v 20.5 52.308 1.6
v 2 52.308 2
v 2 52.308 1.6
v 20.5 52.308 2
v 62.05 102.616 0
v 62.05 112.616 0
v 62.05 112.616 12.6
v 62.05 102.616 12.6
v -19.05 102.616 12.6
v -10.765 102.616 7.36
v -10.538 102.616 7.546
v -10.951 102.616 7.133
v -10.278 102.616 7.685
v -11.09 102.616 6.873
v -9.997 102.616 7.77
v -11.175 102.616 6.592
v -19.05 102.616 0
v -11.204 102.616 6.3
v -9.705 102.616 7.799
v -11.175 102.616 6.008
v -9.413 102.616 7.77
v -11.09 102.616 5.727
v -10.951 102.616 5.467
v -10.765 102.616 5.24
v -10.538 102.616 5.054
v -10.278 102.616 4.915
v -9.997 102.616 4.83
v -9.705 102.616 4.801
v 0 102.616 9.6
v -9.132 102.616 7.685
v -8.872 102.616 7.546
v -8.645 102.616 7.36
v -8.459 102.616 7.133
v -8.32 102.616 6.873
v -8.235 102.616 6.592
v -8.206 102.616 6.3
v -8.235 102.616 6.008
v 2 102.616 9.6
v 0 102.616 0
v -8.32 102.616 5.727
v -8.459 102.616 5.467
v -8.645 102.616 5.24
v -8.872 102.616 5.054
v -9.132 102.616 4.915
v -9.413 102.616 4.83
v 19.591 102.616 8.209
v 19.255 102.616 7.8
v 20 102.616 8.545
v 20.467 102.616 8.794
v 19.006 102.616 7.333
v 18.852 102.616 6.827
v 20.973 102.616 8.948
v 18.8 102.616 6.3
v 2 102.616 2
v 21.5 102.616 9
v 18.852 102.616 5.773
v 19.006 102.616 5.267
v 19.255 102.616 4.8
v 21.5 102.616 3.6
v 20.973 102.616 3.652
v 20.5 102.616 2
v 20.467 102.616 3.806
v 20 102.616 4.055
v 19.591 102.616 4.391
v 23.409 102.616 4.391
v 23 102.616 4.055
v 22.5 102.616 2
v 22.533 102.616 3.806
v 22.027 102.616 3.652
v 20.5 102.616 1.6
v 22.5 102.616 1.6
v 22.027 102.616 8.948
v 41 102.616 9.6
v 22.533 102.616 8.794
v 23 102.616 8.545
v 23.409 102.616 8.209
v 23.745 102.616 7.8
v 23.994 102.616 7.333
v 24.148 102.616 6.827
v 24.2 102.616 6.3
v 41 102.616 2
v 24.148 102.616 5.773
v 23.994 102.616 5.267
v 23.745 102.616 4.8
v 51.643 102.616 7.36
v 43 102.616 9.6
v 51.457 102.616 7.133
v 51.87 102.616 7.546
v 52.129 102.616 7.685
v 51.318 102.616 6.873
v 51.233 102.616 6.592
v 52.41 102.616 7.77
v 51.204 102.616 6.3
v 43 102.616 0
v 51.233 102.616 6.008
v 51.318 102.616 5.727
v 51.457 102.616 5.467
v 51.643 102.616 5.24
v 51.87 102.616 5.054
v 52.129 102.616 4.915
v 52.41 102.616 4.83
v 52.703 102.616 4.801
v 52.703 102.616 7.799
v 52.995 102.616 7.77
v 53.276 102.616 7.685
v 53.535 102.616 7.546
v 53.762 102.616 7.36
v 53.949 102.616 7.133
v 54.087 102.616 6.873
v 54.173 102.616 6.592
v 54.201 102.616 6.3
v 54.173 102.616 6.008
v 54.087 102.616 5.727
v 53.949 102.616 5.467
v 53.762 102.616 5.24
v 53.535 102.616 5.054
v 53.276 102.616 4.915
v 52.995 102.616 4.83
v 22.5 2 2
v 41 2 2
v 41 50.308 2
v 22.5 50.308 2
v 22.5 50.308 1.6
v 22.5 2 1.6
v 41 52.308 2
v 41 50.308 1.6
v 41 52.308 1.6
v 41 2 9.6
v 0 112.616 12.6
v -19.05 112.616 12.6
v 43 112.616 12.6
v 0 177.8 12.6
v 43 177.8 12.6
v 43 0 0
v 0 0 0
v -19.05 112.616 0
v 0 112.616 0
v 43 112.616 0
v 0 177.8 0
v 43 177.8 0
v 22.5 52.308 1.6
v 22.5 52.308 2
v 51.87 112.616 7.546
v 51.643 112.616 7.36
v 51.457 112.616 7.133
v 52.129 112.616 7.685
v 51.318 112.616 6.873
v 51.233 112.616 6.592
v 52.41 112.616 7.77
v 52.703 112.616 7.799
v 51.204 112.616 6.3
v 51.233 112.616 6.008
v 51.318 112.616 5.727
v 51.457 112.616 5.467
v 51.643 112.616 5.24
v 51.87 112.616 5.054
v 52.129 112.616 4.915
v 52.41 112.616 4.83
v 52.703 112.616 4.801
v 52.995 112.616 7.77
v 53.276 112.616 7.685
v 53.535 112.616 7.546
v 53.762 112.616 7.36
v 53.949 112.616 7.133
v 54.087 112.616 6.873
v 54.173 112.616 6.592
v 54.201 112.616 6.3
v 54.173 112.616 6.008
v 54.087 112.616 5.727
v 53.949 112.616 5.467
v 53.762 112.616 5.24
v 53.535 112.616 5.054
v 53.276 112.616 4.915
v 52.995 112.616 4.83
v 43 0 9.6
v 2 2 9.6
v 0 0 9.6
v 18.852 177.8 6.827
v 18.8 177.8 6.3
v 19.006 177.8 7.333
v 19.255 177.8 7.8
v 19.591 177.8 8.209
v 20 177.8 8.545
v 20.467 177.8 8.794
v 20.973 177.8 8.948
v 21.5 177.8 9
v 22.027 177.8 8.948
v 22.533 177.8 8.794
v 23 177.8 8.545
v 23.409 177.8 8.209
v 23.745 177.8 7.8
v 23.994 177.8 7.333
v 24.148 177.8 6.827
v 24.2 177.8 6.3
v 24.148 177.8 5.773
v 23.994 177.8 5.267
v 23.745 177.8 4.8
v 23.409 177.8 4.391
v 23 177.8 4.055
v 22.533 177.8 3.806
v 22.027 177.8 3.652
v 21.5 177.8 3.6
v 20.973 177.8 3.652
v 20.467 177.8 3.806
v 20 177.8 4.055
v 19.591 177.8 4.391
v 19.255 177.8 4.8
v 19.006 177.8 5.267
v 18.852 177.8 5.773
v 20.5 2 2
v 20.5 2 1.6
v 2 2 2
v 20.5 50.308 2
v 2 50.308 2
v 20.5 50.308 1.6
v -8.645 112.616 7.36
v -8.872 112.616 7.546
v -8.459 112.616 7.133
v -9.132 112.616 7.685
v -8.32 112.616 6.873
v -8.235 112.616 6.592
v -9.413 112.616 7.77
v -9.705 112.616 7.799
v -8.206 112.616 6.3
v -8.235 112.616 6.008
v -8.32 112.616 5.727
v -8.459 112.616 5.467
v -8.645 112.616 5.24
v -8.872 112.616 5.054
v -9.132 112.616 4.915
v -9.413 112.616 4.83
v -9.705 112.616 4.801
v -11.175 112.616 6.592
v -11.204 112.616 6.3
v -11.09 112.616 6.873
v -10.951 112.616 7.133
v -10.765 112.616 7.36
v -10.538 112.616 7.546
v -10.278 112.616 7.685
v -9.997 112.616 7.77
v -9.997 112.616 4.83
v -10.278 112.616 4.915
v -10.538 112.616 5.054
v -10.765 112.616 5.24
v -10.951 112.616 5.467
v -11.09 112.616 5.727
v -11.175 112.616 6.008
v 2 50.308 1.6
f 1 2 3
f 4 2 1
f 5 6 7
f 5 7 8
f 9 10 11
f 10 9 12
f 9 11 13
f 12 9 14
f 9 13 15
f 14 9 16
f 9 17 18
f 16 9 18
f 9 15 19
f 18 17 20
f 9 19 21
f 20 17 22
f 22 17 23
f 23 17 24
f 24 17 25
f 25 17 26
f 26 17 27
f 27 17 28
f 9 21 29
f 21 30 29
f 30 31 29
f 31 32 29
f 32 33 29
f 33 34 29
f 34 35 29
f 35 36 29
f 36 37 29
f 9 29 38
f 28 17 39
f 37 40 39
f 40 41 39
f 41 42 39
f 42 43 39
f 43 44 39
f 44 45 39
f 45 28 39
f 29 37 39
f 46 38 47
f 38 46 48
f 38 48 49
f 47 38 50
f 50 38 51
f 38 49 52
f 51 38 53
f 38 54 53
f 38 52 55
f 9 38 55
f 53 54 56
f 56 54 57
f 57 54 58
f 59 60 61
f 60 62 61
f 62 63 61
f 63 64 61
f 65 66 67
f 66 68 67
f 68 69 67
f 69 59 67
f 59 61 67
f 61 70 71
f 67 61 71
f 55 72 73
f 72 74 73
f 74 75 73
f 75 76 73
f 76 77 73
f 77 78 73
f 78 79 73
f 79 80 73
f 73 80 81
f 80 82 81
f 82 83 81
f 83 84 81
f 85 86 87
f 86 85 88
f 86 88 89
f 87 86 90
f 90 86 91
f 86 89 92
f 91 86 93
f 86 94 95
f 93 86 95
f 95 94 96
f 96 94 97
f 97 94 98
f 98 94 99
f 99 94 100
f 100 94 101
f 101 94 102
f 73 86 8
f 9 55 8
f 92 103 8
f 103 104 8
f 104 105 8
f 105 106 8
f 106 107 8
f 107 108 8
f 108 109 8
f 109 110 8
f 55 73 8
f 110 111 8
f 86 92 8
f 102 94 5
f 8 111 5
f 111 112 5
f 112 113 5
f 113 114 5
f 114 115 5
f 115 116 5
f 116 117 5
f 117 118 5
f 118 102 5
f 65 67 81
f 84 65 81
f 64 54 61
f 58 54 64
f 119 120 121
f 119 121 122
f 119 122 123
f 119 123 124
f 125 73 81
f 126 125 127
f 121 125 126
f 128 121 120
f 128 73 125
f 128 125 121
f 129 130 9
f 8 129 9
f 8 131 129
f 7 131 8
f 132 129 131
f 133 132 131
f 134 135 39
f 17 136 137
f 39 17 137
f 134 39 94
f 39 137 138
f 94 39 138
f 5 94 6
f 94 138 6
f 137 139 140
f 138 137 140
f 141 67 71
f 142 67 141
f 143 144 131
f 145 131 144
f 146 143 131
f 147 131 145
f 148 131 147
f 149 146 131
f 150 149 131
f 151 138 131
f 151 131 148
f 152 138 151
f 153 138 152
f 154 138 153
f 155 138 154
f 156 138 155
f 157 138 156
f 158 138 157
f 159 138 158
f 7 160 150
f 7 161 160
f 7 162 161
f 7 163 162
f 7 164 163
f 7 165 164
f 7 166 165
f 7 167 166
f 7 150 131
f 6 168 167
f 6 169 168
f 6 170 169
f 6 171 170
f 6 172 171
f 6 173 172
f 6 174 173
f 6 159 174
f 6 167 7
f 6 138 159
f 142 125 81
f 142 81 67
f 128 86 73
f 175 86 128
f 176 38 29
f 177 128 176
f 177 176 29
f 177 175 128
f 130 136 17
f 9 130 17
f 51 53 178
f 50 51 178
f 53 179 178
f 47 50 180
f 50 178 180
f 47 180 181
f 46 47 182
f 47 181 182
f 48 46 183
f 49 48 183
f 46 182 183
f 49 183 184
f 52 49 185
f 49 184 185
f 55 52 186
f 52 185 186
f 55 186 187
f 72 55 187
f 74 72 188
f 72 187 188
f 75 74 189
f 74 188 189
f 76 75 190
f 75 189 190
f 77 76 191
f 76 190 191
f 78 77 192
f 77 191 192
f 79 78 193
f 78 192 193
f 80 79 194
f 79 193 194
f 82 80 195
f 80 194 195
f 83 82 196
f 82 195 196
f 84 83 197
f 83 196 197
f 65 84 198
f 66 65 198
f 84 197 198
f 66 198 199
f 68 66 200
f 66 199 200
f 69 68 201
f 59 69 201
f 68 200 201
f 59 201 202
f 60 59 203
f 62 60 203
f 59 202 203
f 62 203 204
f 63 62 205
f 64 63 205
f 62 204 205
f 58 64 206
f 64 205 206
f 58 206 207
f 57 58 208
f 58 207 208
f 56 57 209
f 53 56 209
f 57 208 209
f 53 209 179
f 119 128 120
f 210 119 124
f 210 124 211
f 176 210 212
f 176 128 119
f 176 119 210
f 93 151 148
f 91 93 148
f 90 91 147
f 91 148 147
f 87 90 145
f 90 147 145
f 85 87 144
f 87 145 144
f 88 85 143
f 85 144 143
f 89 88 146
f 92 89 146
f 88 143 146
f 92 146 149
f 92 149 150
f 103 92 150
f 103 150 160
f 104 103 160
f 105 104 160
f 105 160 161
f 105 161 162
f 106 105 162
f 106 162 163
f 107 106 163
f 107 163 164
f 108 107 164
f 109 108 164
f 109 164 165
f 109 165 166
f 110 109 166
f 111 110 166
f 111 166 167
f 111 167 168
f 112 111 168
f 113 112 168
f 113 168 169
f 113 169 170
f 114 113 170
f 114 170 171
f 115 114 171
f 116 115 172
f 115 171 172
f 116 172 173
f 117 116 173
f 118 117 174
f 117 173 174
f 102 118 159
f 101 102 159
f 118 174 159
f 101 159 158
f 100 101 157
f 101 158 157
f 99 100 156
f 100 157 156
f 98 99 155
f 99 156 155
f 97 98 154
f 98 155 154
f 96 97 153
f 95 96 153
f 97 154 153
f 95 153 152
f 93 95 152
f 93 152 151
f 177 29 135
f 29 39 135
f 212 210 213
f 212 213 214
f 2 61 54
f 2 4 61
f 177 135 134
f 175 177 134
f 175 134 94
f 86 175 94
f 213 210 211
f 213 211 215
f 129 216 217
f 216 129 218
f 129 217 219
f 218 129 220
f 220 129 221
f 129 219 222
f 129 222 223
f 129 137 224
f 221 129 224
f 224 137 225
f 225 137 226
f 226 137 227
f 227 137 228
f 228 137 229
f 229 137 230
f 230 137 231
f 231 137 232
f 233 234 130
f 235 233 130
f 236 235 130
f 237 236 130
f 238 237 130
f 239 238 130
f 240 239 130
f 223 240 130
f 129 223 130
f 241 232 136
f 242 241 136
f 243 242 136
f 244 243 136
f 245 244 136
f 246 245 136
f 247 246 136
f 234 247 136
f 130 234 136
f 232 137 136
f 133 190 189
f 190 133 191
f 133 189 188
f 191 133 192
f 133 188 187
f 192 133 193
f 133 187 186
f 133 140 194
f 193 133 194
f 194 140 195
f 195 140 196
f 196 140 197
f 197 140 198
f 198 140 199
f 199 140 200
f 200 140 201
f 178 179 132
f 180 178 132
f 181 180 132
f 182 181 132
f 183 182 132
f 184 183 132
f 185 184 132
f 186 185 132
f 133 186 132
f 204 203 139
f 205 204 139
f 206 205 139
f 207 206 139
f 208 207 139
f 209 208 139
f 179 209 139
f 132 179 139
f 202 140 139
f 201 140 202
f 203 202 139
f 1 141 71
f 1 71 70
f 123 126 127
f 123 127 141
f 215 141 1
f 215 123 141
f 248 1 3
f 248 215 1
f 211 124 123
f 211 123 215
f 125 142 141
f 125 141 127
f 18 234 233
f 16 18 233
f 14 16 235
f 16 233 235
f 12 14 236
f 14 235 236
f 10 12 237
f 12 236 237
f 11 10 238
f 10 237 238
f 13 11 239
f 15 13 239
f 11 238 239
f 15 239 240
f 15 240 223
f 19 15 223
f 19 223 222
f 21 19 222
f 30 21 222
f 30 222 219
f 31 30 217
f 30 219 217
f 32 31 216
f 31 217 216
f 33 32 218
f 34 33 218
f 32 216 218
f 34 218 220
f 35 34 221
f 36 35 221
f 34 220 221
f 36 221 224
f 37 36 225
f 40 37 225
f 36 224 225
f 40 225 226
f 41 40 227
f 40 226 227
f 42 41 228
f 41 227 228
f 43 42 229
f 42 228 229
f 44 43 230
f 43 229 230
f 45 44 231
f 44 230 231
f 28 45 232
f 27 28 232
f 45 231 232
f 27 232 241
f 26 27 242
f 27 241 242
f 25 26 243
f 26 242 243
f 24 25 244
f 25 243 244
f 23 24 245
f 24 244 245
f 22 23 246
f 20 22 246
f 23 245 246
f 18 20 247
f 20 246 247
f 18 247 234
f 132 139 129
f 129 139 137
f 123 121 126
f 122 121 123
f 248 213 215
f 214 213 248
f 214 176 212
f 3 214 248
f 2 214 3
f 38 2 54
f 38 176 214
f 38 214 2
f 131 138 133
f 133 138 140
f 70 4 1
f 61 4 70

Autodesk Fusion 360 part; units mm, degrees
sketch "Sketch1" plane through (0, 0, 0) normal (0, 0, 1) x (1, 0, 0)
  line L0 (0, 0) -> (43, 0)
  line L1 (43, 0) -> (43, 177.8)
  line L2 (43, 177.8) -> (0, 177.8)
  line L3 (0, 177.8) -> (0, 0)
  line L4 (0, 112.616) -> (-19.05, 112.616)
  line L5 (-19.05, 112.616) -> (-19.05, 102.616)
  line L6 (-19.05, 102.616) -> (0, 102.616)
  line L7 (0, 102.616) -> (0, 112.616)
  line L8 (43, 112.616) -> (62.05, 112.616)
  line L9 (62.05, 112.616) -> (62.05, 102.616)
  line L10 (62.05, 102.616) -> (43, 102.616)
  line L11 (43, 102.616) -> (43, 112.616)
  dimension "d1" = 177.8
  dimension "d2" = 43
  dimension "d5" = 75.184
  dimension "d6" = 75.184
  dimension "d7" = 10
  dimension "d8" = 10
  dimension "d9" = 19.05
  dimension "d10" = 19.05
extrude "Extrude1" add sketch "Sketch1" along normal blind 12.6
sketch "Sketch2" plane through (0, 0, 12.6) normal (0, 0, 1) x (-1, 0, 0)
  line L0 (-43, -112.616) -> (-43, -177.8)
  line L1 (-43, -177.8) -> (0, -177.8)
  line L2 (0, -177.8) -> (0, -112.616)
  line L3 (0, -112.616) -> (19.05, -112.616)
  line L4 (19.05, -112.616) -> (19.05, -102.616)
  line L5 (19.05, -102.616) -> (0, -102.616)
  line L6 (0, -102.616) -> (0, 0)
  line L7 (0, 0) -> (-43, 0)
  line L8 (-43, 0) -> (-43, -102.616)
  line L9 (-43, -102.616) -> (-62.05, -102.616)
  line L10 (-62.05, -102.616) -> (-62.05, -112.616)
  line L11 (-62.05, -112.616) -> (-43, -112.616)
  line L12 (-2, -102.616) -> (-41, -102.616)
  line L13 (-41, -102.616) -> (-41, -2)
  line L14 (-41, -2) -> (-2, -2)
  line L15 (-2, -2) -> (-2, -102.616)
  dimension "d11" = 2
  dimension "d12" = 2
  dimension "d13" = 2
  dimension "d20" = 10
extrude "Extrude2" cut sketch "Sketch2" against normal blind 10.6 contours L12 L13 L14 L15
sketch "Sketch4" plane through (0, 0, 12.6) normal (0, 0, 1) x (-1, 0, 0)
  line L0 (-41, -102.616) -> (-41, -2)
  line L1 (-41, -2) -> (-2, -2)
  line L2 (-2, -2) -> (-2, -102.616)
  line L3 (-2, -102.616) -> (-41, -102.616)
  line L4 (-43, -112.616) -> (-43, -177.8)
  line L5 (-43, -177.8) -> (0, -177.8)
  line L6 (0, -177.8) -> (0, -112.616)
  line L7 (0, -112.616) -> (19.05, -112.616)
  line L8 (19.05, -112.616) -> (19.05, -102.616)
  line L9 (19.05, -102.616) -> (0, -102.616)
  line L10 (0, -102.616) -> (0, 0)
  line L11 (0, 0) -> (-43, 0)
  line L12 (-43, 0) -> (-43, -102.616)
  line L13 (-43, -102.616) -> (-62.05, -102.616)
  line L14 (-62.05, -102.616) -> (-62.05, -112.616)
  line L15 (-62.05, -112.616) -> (-43, -112.616)
  line L16 (0, -102.616) -> (-43, -102.616)
  line L17 (-43, -102.616) -> (-43, 0)
  line L18 (-43, 0) -> (0, 0)
  line L19 (0, 0) -> (0, -102.616)
extrude "Extrude3" cut sketch "Sketch4" against normal blind 3 contours L0 L1 L2 L10 L11 L12 L16 L17 L18 L19
sketch "Sketch5" plane through (0, 177.8, 0) normal (0, 1, 0) x (-1, 0, 0)
  line L0 (-43, 0) -> (0, 0)
  line L1 (0, 0) -> (0, 12.6)
  line L2 (0, 12.6) -> (-43, 12.6)
  line L3 (-43, 12.6) -> (-43, 0)
  circle A0 centre (-21.5, 6.3) radius 2.7
  dimension "d21" = 5.4
  dimension "d22" = 6.3
extrude "Extrude4" cut sketch "Sketch5" against normal blind 83.82 contours A0
sketch "Sketch6" plane through (0, 0, 2) normal (0, 0, 1) x (-1, 0, 0)
  line L0 (-2, -2) -> (-41, -2)
  line L1 (-41, -2) -> (-41, -102.616)
  line L2 (-41, -102.616) -> (-2, -102.616)
  line L3 (-2, -102.616) -> (-2, -2)
  line L4 (-20.5, -102.616) -> (-22.5, -102.616)
  line L5 (-22.5, -102.616) -> (-22.5, -2)
  line L6 (-22.5, -2) -> (-20.5, -2)
  line L7 (-20.5, -2) -> (-20.5, -102.616)
  line L8 (-43, -102.616) -> (-43, 0)
  line L9 (-2, -52.308) -> (-41, -52.308)
  line L10 (-41, -52.308) -> (-41, -50.308)
  line L11 (-41, -50.308) -> (-2, -50.308)
  line L12 (-2, -50.308) -> (-2, -52.308)
  line L13 (-43, 0) -> (0, 0)
  dimension "d25" = 2
  dimension "d26" = 20.5
  dimension "d27" = 2
  dimension "d28" = 50.308
extrude "Extrude5" cut sketch "Sketch6" against normal blind 0.4 contours L0 L5 L6 L7 L11 | L3 L7 L9 L11 L12 | L5 L7 L9 L11 | L1 L5 L9 L10 L11 | L2 L4 L5 L7 L9
sketch "Sketch7" plane through (0, 112.616, 0) normal (0, 1, 0) x (-1, 0, 0)
  line L0 (0, 0) -> (19.05, 0)
  line L1 (19.05, 0) -> (19.05, 12.6)
  line L2 (19.05, 12.6) -> (0, 12.6)
  line L3 (0, 12.6) -> (0, 0)
  circle A0 centre (9.705, 6.3) radius 1.4986
  circle A1 centre (-52.7028, 6.3) radius 1.4986
  line L4 (-43, 0) -> (-43, 12.6)
  dimension "d31" = 2.9972
  dimension "d32" = 2.9972
  dimension "d33" = 62.4078
  dimension "d34" = 9.7028
extrude "Extrude6" cut sketch "Sketch7" against normal blind 12.7 contours A0 | A1
